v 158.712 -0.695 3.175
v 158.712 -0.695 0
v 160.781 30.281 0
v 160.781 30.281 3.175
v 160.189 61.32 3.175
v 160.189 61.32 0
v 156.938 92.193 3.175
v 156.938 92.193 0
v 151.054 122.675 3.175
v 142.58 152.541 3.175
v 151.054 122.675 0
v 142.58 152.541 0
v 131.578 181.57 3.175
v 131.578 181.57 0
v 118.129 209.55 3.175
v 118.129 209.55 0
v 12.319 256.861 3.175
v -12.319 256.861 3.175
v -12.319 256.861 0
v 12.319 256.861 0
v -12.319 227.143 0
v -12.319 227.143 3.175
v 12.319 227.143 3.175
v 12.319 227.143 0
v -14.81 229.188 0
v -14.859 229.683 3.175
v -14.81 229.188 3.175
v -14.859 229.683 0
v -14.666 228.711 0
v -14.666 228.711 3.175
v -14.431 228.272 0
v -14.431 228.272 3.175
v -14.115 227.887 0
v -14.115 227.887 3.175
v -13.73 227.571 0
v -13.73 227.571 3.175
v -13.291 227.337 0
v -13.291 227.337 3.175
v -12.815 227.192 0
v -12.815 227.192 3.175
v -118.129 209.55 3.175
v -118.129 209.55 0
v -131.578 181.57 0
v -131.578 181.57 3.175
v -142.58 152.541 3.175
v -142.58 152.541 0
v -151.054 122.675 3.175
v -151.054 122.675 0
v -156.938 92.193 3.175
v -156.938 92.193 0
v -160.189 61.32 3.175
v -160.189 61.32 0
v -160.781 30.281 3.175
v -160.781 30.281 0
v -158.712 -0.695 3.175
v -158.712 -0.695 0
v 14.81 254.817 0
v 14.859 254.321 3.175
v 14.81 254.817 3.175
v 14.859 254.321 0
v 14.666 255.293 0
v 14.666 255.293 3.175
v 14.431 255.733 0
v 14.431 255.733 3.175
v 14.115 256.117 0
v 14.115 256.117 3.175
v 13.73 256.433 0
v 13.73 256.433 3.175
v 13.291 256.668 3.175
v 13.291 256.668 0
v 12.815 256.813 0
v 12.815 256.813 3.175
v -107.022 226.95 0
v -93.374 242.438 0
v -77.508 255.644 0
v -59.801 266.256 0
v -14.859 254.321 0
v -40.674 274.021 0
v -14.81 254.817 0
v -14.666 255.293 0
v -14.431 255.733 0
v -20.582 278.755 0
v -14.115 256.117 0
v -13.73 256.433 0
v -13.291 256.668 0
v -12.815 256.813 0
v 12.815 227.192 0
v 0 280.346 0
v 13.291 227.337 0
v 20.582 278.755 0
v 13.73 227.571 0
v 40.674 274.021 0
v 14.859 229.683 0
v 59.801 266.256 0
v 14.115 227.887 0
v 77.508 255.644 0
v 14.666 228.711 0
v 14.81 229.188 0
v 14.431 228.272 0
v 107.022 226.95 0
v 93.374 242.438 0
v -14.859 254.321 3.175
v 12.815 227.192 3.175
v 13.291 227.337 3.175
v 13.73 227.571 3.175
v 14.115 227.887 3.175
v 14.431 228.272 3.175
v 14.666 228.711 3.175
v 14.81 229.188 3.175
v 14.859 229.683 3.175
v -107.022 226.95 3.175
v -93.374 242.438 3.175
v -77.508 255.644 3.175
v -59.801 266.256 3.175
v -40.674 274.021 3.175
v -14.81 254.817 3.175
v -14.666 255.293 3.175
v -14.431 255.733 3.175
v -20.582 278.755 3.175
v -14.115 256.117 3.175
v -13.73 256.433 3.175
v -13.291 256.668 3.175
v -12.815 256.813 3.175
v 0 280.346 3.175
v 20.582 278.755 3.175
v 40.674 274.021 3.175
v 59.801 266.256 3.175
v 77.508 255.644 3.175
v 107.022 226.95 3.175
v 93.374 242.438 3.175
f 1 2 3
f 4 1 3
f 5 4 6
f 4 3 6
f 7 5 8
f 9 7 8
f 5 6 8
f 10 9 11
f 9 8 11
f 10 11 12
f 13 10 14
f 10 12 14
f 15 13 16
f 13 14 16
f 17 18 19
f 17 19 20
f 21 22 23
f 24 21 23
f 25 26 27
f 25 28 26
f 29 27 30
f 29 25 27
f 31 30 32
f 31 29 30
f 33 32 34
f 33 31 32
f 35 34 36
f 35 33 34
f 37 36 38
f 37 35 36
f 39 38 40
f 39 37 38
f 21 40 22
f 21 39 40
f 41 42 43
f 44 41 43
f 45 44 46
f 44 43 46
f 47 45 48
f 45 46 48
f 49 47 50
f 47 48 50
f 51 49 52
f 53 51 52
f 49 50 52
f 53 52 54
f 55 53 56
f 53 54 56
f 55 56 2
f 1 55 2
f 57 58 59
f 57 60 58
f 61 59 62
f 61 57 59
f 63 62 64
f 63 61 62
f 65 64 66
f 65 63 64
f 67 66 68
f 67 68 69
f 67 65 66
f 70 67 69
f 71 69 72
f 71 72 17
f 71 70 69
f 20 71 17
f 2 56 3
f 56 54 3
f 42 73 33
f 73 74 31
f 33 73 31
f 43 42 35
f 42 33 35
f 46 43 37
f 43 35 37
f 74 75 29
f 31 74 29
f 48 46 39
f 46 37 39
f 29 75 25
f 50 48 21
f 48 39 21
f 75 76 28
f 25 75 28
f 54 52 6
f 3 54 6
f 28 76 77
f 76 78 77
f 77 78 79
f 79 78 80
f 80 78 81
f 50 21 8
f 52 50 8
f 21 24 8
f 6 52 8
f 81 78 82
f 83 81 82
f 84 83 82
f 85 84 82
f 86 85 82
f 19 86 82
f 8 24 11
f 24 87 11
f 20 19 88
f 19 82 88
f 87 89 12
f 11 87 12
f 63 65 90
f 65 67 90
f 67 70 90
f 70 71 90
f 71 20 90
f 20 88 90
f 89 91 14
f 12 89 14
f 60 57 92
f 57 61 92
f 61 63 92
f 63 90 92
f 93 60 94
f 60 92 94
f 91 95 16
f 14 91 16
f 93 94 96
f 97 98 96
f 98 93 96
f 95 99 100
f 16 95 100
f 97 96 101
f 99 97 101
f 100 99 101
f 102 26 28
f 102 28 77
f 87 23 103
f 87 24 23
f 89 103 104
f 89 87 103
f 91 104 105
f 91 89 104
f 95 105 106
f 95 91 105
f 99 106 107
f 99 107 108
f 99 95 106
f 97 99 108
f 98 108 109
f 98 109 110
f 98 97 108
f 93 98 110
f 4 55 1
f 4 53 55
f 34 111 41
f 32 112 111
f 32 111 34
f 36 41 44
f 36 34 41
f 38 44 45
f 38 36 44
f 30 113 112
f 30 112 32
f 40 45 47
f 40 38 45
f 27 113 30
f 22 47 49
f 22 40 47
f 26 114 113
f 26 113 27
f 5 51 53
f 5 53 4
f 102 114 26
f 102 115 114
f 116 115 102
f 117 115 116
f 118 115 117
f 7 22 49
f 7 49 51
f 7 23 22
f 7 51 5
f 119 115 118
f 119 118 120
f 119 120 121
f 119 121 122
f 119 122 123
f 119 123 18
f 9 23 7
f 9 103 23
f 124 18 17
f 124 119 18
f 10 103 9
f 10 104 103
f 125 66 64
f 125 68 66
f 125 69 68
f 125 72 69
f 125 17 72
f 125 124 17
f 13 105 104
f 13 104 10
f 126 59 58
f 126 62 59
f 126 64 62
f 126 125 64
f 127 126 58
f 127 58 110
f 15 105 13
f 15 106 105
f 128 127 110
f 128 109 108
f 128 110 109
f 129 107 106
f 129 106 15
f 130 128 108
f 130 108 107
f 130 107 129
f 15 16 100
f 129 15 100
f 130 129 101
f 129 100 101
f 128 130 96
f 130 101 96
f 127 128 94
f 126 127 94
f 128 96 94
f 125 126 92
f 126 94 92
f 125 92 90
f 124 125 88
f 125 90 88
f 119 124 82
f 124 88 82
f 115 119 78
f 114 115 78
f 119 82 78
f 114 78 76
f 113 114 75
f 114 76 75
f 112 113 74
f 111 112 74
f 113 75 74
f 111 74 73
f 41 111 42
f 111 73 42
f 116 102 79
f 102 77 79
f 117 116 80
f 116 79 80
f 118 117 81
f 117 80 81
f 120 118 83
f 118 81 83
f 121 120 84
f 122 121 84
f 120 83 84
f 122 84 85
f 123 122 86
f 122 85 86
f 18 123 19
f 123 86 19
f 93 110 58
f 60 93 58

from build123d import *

# Parameters (mm, degrees)
BOSS_EXTRUDE1_DEPTH = 3.175
CUT_EXTRUDE1_REACH  = 325.245
SKETCH2_W           = 29.718
SKETCH2_H           = 29.718
FILLET1_R           = 2.54


with BuildPart() as part:
    # Sketch1 → Boss-Extrude1 (new body)
    with BuildSketch(Plane.XY):
        with BuildLine():
            ThreePointArc((118.128585461, 209.55), (0, 280.345753402), (-118.128585461, 209.55))
            ThreePointArc((-118.128585461, 209.55), (-154.323359707, 107.497469491), (-158.711897248, -0.694588462))
            Line((-158.711897248, -0.694588462), (158.711897248, -0.694588462))
            ThreePointArc((158.711897248, -0.694588462), (154.323359707, 107.497469491), (118.128585461, 209.55))
        make_face()
    extrude(amount=BOSS_EXTRUDE1_DEPTH)

    # Sketch2 → Cut-Extrude1 (cut, up to next)
    with BuildSketch(Plane.XY.offset(3.175), mode=Mode.PRIVATE) as cut_extrude1_sk1:
        with Locations((0, 242.002411538)):
            Rectangle(SKETCH2_W, SKETCH2_H)
    cut_extrude1_tool1 = extrude(cut_extrude1_sk1.sketch, amount=-CUT_EXTRUDE1_REACH, mode=Mode.PRIVATE) & part.part
    add(cut_extrude1_tool1.solids().sort_by_distance((0, 242.002412, 3.175))[0], mode=Mode.SUBTRACT)

    # Fillet1
    fillet1_edges = [part.edges().sort_by_distance(p)[0] for p in [
        (14.859, 227.143411538, 1.5875),
        (14.859, 256.861411538, 1.5875),
        (-14.859, 256.861411538, 1.5875),
        (-14.859, 227.143411538, 1.5875),
    ]]
    fillet(fillet1_edges, radius=FILLET1_R)


solid = part.part
